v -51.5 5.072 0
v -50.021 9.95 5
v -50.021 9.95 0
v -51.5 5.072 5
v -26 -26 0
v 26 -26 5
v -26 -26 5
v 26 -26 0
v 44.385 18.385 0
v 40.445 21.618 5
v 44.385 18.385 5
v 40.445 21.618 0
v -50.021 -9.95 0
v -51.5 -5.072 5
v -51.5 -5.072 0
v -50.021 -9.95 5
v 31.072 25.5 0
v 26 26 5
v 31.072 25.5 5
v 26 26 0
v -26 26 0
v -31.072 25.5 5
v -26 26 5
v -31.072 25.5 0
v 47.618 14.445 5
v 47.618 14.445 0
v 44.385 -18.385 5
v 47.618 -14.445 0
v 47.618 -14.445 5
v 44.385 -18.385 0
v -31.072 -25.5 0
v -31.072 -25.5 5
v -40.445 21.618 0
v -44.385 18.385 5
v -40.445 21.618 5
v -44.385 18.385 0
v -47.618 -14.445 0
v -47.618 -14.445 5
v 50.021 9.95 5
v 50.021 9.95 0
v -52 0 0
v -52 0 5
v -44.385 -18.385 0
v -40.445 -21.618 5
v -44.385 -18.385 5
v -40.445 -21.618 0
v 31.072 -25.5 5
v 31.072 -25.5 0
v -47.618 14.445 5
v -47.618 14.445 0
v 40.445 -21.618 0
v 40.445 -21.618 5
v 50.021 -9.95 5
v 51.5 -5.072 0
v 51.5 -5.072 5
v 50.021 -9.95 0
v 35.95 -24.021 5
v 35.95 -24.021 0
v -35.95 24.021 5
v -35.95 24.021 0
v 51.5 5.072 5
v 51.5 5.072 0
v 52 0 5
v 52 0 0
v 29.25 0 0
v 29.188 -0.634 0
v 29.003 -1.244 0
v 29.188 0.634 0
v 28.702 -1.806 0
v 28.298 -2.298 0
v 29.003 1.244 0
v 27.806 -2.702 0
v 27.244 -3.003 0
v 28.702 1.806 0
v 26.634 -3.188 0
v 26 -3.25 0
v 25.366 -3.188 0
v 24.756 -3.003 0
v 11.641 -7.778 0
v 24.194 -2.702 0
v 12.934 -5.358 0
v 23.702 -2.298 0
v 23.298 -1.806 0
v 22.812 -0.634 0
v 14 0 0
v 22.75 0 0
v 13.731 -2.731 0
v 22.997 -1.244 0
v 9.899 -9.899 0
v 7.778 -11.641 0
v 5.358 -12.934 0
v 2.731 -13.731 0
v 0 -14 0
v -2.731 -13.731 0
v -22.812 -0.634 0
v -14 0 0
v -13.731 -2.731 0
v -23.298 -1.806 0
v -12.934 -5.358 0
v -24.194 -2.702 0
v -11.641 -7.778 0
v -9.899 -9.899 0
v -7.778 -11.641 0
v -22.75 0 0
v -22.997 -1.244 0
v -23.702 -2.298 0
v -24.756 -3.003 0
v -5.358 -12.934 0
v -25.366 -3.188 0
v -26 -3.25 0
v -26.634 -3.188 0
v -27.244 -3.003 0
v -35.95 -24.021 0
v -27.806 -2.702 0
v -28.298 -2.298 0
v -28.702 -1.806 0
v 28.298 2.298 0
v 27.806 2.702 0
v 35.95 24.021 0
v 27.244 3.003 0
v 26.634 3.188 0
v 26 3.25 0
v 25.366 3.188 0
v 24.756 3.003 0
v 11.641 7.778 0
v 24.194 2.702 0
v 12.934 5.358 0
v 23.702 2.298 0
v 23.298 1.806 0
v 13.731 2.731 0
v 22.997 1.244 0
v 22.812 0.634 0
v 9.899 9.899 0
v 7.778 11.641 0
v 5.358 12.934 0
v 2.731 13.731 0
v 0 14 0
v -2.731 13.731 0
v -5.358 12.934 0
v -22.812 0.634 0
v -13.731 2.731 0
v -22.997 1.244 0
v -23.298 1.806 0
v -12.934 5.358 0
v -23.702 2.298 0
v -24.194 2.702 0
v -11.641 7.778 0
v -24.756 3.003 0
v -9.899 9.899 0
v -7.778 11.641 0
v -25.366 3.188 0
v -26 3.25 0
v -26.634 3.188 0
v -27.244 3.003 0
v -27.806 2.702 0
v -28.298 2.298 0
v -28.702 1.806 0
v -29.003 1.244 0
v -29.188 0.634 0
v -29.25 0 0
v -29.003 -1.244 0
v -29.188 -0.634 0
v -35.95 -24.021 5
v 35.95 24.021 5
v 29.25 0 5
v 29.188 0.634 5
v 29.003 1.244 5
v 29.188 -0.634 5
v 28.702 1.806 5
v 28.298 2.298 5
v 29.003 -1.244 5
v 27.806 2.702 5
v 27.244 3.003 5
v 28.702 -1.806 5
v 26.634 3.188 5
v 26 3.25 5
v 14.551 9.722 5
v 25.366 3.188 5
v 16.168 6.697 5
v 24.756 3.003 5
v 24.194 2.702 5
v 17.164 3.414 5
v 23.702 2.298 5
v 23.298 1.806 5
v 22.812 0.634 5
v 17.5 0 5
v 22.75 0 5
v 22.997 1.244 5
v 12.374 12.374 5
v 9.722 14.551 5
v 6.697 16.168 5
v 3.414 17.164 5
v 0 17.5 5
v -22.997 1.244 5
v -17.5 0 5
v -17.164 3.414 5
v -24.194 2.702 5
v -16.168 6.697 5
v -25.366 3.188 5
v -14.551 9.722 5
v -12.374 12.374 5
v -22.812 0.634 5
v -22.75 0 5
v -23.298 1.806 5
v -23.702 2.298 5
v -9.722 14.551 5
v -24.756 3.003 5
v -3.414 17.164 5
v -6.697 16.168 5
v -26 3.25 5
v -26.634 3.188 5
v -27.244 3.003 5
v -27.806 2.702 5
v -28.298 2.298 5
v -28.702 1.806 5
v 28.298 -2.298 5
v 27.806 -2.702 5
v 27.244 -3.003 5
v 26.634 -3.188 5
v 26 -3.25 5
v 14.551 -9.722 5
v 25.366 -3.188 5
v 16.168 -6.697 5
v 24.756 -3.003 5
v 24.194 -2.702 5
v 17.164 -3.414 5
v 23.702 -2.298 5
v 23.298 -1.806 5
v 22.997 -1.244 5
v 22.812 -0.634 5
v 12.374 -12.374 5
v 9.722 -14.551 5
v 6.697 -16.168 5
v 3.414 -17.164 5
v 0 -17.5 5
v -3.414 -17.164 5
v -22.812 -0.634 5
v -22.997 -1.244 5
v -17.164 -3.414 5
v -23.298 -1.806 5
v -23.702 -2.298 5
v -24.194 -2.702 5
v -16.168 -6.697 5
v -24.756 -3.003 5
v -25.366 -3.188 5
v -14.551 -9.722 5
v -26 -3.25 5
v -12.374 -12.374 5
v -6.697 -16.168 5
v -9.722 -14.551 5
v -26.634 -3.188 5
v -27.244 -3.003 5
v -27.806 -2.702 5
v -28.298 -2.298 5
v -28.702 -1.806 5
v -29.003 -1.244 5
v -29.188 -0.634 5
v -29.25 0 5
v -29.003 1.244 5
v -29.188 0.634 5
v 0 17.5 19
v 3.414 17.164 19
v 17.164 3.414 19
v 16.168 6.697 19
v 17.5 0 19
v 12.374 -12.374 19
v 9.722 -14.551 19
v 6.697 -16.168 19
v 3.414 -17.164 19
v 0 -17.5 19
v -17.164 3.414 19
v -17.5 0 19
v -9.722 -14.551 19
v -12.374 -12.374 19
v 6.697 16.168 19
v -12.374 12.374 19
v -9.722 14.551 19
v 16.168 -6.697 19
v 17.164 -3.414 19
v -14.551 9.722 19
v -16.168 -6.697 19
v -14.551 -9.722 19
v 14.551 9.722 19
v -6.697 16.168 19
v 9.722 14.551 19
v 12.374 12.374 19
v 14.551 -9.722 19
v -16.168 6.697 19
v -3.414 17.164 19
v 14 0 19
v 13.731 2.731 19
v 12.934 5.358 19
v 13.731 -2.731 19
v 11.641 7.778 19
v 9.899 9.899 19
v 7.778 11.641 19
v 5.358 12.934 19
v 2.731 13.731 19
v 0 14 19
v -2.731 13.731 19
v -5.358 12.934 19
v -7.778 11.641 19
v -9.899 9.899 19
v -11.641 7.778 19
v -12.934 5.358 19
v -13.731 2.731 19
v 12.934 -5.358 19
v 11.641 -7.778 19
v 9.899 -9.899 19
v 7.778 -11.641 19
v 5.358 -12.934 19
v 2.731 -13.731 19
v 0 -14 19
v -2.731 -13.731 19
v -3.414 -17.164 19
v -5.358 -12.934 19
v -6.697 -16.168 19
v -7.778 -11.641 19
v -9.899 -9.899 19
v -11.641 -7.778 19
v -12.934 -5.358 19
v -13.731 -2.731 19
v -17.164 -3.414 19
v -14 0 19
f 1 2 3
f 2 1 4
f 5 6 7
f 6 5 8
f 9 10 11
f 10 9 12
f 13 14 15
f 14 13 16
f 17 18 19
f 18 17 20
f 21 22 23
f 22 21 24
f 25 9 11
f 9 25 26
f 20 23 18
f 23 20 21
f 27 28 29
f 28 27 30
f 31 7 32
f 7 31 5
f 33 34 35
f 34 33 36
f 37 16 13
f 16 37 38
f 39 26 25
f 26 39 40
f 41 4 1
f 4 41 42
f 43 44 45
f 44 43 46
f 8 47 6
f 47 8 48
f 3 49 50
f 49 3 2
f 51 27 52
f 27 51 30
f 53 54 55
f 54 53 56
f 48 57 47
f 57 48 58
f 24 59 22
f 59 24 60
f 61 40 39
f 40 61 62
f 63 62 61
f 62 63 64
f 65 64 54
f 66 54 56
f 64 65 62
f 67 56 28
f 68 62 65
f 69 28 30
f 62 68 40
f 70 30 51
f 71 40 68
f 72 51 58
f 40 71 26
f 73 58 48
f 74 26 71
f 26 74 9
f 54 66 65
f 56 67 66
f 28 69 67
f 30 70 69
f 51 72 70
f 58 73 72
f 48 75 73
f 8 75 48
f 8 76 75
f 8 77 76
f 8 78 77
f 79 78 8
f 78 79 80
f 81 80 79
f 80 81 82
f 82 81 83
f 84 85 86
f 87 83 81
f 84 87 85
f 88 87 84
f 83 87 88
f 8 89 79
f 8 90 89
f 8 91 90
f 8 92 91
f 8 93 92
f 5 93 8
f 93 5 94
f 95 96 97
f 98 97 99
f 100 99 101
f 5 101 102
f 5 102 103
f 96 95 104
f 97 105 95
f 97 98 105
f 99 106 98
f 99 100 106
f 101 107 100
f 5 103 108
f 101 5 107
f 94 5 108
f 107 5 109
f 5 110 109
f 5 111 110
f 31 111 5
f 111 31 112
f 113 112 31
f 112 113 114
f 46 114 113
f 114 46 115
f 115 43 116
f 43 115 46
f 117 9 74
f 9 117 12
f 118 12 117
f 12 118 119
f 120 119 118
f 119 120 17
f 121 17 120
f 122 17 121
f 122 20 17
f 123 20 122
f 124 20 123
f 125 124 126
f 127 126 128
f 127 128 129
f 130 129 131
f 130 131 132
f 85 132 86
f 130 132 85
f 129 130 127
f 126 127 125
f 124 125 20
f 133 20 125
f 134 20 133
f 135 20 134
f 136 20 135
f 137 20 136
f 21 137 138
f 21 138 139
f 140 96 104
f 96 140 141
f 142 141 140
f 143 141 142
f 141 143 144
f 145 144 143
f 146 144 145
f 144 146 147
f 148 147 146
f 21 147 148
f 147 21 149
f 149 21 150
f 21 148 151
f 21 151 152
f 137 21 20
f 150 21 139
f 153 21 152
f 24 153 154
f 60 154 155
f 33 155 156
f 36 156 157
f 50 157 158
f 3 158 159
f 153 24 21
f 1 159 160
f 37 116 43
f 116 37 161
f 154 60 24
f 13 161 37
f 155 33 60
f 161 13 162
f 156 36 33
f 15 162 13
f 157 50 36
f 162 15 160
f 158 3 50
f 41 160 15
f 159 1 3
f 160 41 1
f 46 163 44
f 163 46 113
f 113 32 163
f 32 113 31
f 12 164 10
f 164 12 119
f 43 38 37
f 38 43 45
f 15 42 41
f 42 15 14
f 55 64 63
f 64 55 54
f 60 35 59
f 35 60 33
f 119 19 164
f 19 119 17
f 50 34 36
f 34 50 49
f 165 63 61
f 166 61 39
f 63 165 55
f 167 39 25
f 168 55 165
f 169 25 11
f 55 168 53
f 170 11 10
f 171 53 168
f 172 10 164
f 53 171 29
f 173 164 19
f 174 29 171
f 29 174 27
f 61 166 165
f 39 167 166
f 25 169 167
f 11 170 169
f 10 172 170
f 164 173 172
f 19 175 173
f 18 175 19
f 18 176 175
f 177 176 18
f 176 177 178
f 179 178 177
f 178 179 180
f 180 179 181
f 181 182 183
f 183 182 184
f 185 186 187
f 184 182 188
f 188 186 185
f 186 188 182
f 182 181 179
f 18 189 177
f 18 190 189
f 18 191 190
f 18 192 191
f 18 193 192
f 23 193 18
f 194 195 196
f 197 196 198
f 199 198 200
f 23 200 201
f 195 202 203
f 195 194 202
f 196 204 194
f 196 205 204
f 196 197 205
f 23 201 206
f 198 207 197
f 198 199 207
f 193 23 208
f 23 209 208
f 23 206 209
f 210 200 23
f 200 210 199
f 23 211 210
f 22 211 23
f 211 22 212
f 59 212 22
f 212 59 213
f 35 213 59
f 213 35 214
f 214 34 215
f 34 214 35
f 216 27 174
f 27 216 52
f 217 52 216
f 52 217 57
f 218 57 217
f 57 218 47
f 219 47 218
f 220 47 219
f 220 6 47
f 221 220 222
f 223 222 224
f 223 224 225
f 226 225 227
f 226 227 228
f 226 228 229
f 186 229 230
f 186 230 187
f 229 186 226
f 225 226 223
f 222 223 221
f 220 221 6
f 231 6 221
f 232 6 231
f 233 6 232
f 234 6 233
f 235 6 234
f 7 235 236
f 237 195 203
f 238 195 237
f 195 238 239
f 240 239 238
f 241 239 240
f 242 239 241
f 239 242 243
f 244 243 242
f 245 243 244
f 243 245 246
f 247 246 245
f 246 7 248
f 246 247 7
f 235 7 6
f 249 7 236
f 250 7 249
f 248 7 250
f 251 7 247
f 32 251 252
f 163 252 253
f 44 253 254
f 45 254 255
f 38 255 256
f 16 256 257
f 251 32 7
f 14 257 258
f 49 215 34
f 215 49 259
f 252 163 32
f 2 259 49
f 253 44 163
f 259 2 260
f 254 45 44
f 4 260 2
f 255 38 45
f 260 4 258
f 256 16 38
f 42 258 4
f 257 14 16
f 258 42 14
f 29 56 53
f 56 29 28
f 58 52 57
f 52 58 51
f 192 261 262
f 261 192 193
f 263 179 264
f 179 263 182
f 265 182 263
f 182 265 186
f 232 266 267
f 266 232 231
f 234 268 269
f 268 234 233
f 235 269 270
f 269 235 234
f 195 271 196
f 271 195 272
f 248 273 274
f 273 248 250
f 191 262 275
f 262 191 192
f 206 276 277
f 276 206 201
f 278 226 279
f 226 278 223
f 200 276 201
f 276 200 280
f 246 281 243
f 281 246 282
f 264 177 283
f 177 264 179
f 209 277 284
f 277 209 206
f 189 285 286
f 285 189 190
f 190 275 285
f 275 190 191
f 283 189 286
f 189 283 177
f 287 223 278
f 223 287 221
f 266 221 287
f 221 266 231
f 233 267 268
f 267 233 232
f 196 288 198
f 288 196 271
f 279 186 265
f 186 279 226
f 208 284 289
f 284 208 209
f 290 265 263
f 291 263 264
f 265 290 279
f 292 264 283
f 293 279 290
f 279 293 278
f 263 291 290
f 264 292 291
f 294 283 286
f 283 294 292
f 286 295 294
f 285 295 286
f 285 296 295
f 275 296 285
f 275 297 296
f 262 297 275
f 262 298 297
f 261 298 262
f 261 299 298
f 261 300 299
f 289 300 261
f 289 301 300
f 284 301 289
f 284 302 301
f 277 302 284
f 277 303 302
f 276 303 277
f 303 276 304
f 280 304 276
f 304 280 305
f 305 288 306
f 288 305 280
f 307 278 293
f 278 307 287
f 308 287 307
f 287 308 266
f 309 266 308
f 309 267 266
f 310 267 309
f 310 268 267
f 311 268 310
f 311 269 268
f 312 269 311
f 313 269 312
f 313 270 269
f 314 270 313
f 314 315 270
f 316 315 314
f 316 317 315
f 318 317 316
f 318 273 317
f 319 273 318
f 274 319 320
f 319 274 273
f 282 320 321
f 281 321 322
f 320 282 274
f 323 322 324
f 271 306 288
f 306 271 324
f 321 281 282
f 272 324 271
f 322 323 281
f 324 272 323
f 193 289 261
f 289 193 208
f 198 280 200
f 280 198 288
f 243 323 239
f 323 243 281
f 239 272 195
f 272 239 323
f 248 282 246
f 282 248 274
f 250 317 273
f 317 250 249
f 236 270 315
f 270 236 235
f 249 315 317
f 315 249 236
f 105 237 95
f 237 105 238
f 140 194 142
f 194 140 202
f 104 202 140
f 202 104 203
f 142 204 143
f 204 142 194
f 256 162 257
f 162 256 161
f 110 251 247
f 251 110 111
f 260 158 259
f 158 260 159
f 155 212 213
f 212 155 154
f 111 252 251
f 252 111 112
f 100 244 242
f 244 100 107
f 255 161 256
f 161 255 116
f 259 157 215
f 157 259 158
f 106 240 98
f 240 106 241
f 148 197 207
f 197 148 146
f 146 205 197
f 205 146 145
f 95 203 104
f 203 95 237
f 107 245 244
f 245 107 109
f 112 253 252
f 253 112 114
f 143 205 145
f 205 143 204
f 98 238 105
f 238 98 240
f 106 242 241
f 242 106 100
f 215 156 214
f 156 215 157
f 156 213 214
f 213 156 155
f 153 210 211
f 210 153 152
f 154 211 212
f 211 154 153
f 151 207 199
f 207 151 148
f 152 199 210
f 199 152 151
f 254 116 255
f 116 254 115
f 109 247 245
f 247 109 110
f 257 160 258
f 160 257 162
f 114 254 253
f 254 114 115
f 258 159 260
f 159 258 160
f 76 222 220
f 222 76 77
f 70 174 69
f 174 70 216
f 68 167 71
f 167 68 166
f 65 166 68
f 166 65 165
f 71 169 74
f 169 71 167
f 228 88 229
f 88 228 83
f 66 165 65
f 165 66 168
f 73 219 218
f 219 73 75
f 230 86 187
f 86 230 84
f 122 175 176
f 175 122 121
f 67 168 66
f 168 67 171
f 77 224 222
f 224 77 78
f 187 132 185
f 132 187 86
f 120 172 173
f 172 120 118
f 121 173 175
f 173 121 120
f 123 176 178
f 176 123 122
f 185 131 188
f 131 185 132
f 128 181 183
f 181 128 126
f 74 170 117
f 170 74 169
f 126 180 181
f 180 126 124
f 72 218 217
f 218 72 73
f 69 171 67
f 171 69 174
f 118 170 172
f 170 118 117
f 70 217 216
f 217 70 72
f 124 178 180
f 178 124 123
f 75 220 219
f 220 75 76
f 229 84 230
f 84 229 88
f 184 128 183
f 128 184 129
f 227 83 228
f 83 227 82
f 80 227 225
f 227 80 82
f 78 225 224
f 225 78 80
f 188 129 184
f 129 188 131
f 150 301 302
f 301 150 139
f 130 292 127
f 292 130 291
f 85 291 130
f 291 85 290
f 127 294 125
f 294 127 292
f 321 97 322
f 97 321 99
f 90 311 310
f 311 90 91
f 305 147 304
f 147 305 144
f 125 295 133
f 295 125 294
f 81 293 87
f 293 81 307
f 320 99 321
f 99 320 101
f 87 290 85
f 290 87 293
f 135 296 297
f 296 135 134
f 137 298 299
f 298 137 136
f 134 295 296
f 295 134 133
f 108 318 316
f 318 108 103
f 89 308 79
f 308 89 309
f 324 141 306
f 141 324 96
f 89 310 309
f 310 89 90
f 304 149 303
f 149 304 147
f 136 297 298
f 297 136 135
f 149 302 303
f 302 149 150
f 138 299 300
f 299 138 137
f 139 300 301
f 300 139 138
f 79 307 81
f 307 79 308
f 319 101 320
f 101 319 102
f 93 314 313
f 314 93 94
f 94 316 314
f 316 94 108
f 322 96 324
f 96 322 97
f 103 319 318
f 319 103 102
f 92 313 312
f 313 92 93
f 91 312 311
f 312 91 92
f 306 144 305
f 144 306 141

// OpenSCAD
$fn = 32;
// Oval two-bolt flange.

bore_d = 28;
pad_w = 52;
centres = 52;
bolt_d = 6.5;
flange_t = 5;
neck_l = 14;
neck_d = bore_d + 7;

difference() {
    union() {
        hull()
            for (x = [-centres / 2, centres / 2])
                translate([x, 0, 0]) cylinder(h = flange_t, d = pad_w);
        translate([0, 0, flange_t]) cylinder(h = neck_l, d = neck_d);
    }
    translate([0, 0, -1]) cylinder(h = flange_t + neck_l + 2, d = bore_d);
    for (x = [-centres / 2, centres / 2])
        translate([x, 0, -1]) cylinder(h = flange_t + 2, d = bolt_d);
}
